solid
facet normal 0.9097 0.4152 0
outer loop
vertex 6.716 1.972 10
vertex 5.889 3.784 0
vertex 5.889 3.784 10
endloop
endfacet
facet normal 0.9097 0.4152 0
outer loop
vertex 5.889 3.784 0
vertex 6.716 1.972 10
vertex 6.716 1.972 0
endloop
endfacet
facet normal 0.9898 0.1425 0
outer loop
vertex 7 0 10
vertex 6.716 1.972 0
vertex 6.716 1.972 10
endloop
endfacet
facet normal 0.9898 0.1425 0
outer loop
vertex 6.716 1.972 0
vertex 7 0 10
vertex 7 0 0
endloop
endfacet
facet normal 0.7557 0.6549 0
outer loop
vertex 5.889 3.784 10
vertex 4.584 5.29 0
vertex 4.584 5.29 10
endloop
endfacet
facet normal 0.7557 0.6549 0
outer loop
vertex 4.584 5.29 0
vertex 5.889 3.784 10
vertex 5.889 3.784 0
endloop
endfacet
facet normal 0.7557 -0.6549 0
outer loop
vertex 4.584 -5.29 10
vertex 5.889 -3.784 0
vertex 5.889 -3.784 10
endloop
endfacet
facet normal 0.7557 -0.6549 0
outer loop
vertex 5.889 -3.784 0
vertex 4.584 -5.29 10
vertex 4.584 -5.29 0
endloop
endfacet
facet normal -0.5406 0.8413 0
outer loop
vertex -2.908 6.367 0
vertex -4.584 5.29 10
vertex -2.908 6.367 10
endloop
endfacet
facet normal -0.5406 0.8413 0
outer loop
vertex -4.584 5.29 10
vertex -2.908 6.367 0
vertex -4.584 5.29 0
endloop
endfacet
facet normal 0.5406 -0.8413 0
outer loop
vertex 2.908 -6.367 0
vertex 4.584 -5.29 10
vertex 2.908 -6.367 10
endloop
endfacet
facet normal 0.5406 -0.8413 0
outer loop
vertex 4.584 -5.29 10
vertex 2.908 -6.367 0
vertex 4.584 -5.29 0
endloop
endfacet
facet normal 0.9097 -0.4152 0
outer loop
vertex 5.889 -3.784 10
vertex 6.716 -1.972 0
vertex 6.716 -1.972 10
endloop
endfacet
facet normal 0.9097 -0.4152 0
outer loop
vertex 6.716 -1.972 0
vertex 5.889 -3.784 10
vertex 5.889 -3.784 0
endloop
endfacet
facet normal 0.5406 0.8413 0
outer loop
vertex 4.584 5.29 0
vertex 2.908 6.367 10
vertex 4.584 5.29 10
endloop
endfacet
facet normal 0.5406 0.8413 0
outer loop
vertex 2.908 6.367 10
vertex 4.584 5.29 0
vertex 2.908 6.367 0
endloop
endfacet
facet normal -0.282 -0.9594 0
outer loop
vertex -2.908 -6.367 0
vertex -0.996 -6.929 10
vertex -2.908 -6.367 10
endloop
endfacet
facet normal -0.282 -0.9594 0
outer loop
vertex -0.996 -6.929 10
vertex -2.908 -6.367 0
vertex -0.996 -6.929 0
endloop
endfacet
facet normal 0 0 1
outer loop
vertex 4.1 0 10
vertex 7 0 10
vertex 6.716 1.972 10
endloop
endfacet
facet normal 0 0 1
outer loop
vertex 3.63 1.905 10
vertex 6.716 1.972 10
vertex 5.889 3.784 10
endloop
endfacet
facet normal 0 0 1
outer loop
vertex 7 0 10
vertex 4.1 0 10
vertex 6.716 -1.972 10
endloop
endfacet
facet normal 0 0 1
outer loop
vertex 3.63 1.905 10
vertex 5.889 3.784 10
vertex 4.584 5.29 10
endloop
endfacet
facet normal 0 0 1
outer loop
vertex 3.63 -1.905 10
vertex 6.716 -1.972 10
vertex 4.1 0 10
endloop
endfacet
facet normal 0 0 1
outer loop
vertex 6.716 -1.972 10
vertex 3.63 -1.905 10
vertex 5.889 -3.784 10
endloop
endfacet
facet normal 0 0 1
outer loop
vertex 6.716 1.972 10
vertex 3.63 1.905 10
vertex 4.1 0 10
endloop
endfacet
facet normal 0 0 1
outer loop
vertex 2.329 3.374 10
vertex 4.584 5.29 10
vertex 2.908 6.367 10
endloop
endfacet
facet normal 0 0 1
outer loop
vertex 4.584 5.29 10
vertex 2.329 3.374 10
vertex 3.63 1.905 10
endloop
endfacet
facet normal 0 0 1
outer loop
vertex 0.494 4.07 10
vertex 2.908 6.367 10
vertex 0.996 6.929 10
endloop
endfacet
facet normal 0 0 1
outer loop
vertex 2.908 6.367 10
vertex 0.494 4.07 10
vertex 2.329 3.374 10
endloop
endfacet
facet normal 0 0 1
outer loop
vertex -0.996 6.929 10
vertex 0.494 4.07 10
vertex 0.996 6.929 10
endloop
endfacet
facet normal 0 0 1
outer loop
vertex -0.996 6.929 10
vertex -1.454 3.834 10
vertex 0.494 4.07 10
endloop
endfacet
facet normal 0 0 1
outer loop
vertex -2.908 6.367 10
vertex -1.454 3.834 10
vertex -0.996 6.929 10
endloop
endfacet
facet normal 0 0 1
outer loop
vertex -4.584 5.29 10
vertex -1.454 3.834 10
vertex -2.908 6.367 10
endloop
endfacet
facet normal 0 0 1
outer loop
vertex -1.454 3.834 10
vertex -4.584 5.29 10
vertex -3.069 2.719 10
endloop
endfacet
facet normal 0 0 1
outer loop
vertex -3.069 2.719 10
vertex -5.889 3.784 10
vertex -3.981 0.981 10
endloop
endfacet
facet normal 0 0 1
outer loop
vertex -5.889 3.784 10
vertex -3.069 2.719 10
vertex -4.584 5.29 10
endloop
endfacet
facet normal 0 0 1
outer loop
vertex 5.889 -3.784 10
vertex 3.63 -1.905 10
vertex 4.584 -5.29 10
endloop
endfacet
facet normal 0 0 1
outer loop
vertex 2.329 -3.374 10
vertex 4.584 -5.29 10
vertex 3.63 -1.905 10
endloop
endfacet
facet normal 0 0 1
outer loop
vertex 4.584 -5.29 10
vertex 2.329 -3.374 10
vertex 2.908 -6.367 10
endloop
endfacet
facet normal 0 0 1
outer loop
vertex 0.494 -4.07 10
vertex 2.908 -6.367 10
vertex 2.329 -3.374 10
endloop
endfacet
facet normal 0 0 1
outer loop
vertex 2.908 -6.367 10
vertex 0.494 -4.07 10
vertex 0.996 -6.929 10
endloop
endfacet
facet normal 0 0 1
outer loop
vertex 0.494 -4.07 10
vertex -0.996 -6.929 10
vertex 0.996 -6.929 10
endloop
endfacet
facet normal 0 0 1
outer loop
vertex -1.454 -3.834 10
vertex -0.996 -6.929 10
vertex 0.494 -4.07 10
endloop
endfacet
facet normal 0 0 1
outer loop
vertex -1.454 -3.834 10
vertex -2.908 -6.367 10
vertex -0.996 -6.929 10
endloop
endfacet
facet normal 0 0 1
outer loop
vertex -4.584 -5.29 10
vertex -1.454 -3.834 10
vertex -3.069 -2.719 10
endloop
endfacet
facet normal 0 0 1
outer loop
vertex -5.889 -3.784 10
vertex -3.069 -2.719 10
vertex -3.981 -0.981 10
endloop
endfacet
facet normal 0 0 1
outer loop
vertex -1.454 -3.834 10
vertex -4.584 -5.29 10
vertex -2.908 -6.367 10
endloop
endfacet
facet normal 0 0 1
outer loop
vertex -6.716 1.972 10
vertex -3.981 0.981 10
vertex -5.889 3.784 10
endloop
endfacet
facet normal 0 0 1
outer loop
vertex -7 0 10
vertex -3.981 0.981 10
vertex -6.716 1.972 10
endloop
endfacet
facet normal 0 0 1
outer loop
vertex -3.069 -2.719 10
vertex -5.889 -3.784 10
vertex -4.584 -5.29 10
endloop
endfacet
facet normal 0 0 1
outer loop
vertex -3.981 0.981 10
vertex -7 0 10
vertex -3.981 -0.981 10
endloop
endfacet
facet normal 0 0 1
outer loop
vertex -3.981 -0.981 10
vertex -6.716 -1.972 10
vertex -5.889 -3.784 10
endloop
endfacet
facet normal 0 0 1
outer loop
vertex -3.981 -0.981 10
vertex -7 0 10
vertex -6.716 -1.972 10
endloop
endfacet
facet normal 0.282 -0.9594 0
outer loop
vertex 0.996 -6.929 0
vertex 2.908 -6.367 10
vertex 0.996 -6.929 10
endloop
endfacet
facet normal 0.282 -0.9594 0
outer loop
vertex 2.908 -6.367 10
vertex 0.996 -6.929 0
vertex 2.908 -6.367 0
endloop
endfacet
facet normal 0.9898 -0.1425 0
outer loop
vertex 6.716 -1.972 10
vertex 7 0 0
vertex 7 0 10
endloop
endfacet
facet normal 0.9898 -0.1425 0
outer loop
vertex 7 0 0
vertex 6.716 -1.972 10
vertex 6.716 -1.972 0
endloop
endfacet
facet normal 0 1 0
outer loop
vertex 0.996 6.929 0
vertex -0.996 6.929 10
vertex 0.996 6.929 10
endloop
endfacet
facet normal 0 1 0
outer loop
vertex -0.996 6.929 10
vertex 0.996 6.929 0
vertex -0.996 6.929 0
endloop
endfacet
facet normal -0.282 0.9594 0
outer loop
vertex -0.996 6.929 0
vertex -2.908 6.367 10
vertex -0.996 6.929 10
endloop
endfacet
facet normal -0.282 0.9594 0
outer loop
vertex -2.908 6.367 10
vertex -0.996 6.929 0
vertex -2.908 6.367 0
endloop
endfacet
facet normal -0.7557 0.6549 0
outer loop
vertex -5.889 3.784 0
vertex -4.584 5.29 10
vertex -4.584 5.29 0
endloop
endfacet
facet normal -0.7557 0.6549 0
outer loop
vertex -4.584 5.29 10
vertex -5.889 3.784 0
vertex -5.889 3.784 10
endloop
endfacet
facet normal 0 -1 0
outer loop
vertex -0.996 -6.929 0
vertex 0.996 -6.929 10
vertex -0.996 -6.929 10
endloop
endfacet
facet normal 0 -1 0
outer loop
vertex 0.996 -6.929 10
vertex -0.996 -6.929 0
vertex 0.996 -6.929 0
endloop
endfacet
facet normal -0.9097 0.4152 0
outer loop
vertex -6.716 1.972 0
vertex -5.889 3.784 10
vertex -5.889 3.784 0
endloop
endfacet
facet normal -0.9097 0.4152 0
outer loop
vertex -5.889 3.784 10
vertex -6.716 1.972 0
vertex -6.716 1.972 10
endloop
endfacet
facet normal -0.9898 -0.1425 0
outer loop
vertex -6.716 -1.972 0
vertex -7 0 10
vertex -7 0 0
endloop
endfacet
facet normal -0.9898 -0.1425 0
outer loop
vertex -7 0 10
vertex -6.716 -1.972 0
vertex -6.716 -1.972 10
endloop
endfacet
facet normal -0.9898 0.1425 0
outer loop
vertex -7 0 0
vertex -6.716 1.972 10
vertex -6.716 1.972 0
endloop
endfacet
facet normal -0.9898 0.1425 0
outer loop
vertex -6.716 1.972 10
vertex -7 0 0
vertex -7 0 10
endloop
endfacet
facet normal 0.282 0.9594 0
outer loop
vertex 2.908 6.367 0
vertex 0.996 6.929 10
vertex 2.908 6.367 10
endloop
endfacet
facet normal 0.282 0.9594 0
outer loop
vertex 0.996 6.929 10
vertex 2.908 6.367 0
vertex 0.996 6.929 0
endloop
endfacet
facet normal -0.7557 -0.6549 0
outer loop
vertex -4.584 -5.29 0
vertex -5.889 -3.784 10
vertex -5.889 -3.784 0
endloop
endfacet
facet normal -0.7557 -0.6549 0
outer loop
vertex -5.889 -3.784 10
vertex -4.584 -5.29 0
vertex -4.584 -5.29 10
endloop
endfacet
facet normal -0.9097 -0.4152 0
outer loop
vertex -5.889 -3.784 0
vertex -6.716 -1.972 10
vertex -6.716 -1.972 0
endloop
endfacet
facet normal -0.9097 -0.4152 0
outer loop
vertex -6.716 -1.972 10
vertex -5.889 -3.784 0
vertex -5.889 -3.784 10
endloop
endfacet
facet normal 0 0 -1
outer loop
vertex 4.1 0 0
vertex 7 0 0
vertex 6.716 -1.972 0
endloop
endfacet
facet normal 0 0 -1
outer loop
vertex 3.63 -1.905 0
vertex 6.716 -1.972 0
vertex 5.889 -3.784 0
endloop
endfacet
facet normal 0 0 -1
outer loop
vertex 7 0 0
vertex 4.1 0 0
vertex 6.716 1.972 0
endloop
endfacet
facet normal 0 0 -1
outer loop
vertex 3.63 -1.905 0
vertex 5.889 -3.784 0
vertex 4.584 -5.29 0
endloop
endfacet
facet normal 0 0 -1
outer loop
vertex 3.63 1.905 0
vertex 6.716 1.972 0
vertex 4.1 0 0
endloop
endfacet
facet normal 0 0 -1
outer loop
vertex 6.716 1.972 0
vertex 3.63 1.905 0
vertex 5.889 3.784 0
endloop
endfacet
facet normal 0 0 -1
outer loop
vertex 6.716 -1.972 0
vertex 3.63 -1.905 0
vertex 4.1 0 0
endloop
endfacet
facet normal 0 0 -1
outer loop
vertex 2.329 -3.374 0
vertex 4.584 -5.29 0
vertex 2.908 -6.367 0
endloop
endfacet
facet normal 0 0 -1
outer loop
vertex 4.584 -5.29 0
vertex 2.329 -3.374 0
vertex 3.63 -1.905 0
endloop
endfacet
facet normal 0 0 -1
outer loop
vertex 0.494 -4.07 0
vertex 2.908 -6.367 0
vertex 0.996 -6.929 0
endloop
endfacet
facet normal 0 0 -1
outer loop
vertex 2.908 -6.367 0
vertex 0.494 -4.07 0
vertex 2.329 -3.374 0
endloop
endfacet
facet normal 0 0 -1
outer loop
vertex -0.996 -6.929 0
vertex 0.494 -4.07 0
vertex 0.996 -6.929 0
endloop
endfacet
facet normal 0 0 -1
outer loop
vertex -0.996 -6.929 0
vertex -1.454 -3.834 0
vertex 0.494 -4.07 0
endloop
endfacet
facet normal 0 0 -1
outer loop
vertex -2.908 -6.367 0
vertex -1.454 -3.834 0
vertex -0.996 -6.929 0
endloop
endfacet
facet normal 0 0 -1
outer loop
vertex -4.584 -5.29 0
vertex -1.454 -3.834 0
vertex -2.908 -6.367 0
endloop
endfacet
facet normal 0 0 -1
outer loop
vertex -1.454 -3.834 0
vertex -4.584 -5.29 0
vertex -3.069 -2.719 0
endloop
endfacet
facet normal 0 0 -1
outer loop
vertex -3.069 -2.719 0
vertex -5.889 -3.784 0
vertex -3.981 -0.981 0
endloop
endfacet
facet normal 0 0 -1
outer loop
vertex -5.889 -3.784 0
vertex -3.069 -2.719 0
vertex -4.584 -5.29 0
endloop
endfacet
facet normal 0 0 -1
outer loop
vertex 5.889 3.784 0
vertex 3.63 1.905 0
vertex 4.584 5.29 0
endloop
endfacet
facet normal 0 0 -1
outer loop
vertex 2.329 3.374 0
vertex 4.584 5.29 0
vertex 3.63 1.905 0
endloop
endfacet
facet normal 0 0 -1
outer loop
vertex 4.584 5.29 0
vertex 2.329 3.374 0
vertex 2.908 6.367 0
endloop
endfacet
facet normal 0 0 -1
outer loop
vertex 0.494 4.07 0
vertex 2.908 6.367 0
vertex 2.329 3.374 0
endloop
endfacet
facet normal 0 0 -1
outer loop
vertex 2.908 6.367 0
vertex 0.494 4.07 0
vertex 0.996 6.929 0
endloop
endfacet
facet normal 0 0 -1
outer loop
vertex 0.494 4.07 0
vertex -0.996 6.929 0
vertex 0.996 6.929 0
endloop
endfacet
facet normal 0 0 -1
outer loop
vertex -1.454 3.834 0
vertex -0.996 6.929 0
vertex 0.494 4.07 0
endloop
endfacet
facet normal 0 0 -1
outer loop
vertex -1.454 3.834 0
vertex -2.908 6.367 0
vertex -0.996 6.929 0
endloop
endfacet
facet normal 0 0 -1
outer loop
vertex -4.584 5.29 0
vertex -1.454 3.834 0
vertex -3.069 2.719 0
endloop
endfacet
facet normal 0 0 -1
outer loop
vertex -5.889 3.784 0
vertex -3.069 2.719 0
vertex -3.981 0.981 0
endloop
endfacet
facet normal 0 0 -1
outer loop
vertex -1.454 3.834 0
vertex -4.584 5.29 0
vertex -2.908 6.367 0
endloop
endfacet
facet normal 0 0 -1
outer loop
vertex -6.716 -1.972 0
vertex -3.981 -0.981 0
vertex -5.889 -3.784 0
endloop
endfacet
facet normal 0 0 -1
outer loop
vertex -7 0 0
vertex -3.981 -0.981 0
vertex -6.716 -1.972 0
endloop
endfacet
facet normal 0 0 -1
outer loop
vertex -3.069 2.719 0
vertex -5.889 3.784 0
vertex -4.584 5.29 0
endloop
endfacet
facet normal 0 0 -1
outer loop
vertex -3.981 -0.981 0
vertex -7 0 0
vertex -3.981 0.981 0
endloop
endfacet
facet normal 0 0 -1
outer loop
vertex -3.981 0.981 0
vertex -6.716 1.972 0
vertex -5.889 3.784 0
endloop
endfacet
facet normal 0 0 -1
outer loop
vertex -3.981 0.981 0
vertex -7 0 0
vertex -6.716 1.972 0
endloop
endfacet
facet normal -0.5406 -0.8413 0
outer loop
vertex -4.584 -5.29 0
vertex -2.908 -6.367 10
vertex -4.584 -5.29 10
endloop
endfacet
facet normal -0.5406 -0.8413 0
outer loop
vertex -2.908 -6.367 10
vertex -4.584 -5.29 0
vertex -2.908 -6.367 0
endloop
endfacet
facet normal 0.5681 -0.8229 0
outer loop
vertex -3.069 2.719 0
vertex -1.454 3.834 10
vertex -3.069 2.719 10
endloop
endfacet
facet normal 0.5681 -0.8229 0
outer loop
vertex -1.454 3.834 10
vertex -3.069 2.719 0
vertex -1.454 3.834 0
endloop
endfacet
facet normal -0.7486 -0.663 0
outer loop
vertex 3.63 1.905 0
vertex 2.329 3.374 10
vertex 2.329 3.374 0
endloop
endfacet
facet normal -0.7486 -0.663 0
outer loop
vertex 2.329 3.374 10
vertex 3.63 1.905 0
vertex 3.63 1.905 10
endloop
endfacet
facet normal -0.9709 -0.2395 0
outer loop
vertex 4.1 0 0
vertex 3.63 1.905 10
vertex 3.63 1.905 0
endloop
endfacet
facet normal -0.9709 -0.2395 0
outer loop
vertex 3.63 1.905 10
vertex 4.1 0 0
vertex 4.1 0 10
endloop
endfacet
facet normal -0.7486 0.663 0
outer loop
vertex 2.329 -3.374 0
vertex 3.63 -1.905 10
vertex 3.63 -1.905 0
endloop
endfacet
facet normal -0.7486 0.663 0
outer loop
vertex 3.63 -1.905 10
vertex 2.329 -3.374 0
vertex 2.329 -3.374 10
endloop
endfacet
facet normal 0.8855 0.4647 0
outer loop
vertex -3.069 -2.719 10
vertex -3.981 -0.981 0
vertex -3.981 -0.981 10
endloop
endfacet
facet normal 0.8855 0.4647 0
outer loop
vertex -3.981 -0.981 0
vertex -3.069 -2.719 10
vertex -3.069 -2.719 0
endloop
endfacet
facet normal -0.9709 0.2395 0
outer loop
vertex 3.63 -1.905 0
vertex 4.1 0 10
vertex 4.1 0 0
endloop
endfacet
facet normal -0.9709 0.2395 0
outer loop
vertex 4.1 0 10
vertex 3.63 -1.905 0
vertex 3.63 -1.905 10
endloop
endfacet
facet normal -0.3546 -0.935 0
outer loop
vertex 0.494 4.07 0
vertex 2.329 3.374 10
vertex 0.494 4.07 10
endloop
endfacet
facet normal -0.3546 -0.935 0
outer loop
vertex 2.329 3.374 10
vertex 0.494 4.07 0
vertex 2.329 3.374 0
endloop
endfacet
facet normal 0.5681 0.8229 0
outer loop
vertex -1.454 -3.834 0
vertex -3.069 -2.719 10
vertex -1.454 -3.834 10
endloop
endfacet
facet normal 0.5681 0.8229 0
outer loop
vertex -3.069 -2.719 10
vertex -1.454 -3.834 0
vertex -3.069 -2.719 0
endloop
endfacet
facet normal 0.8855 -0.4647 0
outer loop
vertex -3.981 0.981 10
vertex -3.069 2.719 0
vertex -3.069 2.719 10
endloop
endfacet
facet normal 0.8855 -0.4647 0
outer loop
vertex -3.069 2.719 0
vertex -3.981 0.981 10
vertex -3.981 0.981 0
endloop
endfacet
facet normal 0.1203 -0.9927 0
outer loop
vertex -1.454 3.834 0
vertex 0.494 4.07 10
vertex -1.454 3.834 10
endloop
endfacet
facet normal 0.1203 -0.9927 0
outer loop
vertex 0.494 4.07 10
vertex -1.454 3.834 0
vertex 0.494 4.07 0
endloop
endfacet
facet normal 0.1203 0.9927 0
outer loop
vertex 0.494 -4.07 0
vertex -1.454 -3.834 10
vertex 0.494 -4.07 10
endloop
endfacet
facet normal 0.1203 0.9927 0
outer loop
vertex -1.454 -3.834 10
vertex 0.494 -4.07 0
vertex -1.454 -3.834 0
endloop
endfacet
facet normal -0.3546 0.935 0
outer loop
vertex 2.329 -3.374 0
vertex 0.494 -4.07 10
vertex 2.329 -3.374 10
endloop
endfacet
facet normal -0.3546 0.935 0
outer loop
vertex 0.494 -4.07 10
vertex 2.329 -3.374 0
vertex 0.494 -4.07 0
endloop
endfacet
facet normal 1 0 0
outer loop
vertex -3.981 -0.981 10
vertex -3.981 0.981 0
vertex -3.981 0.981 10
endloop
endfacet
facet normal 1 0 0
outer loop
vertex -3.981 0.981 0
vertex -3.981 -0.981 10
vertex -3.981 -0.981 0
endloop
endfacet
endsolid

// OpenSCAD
difference() {

cylinder(r=7,h=10);
cylinder(r=4.1,h=10);

}
